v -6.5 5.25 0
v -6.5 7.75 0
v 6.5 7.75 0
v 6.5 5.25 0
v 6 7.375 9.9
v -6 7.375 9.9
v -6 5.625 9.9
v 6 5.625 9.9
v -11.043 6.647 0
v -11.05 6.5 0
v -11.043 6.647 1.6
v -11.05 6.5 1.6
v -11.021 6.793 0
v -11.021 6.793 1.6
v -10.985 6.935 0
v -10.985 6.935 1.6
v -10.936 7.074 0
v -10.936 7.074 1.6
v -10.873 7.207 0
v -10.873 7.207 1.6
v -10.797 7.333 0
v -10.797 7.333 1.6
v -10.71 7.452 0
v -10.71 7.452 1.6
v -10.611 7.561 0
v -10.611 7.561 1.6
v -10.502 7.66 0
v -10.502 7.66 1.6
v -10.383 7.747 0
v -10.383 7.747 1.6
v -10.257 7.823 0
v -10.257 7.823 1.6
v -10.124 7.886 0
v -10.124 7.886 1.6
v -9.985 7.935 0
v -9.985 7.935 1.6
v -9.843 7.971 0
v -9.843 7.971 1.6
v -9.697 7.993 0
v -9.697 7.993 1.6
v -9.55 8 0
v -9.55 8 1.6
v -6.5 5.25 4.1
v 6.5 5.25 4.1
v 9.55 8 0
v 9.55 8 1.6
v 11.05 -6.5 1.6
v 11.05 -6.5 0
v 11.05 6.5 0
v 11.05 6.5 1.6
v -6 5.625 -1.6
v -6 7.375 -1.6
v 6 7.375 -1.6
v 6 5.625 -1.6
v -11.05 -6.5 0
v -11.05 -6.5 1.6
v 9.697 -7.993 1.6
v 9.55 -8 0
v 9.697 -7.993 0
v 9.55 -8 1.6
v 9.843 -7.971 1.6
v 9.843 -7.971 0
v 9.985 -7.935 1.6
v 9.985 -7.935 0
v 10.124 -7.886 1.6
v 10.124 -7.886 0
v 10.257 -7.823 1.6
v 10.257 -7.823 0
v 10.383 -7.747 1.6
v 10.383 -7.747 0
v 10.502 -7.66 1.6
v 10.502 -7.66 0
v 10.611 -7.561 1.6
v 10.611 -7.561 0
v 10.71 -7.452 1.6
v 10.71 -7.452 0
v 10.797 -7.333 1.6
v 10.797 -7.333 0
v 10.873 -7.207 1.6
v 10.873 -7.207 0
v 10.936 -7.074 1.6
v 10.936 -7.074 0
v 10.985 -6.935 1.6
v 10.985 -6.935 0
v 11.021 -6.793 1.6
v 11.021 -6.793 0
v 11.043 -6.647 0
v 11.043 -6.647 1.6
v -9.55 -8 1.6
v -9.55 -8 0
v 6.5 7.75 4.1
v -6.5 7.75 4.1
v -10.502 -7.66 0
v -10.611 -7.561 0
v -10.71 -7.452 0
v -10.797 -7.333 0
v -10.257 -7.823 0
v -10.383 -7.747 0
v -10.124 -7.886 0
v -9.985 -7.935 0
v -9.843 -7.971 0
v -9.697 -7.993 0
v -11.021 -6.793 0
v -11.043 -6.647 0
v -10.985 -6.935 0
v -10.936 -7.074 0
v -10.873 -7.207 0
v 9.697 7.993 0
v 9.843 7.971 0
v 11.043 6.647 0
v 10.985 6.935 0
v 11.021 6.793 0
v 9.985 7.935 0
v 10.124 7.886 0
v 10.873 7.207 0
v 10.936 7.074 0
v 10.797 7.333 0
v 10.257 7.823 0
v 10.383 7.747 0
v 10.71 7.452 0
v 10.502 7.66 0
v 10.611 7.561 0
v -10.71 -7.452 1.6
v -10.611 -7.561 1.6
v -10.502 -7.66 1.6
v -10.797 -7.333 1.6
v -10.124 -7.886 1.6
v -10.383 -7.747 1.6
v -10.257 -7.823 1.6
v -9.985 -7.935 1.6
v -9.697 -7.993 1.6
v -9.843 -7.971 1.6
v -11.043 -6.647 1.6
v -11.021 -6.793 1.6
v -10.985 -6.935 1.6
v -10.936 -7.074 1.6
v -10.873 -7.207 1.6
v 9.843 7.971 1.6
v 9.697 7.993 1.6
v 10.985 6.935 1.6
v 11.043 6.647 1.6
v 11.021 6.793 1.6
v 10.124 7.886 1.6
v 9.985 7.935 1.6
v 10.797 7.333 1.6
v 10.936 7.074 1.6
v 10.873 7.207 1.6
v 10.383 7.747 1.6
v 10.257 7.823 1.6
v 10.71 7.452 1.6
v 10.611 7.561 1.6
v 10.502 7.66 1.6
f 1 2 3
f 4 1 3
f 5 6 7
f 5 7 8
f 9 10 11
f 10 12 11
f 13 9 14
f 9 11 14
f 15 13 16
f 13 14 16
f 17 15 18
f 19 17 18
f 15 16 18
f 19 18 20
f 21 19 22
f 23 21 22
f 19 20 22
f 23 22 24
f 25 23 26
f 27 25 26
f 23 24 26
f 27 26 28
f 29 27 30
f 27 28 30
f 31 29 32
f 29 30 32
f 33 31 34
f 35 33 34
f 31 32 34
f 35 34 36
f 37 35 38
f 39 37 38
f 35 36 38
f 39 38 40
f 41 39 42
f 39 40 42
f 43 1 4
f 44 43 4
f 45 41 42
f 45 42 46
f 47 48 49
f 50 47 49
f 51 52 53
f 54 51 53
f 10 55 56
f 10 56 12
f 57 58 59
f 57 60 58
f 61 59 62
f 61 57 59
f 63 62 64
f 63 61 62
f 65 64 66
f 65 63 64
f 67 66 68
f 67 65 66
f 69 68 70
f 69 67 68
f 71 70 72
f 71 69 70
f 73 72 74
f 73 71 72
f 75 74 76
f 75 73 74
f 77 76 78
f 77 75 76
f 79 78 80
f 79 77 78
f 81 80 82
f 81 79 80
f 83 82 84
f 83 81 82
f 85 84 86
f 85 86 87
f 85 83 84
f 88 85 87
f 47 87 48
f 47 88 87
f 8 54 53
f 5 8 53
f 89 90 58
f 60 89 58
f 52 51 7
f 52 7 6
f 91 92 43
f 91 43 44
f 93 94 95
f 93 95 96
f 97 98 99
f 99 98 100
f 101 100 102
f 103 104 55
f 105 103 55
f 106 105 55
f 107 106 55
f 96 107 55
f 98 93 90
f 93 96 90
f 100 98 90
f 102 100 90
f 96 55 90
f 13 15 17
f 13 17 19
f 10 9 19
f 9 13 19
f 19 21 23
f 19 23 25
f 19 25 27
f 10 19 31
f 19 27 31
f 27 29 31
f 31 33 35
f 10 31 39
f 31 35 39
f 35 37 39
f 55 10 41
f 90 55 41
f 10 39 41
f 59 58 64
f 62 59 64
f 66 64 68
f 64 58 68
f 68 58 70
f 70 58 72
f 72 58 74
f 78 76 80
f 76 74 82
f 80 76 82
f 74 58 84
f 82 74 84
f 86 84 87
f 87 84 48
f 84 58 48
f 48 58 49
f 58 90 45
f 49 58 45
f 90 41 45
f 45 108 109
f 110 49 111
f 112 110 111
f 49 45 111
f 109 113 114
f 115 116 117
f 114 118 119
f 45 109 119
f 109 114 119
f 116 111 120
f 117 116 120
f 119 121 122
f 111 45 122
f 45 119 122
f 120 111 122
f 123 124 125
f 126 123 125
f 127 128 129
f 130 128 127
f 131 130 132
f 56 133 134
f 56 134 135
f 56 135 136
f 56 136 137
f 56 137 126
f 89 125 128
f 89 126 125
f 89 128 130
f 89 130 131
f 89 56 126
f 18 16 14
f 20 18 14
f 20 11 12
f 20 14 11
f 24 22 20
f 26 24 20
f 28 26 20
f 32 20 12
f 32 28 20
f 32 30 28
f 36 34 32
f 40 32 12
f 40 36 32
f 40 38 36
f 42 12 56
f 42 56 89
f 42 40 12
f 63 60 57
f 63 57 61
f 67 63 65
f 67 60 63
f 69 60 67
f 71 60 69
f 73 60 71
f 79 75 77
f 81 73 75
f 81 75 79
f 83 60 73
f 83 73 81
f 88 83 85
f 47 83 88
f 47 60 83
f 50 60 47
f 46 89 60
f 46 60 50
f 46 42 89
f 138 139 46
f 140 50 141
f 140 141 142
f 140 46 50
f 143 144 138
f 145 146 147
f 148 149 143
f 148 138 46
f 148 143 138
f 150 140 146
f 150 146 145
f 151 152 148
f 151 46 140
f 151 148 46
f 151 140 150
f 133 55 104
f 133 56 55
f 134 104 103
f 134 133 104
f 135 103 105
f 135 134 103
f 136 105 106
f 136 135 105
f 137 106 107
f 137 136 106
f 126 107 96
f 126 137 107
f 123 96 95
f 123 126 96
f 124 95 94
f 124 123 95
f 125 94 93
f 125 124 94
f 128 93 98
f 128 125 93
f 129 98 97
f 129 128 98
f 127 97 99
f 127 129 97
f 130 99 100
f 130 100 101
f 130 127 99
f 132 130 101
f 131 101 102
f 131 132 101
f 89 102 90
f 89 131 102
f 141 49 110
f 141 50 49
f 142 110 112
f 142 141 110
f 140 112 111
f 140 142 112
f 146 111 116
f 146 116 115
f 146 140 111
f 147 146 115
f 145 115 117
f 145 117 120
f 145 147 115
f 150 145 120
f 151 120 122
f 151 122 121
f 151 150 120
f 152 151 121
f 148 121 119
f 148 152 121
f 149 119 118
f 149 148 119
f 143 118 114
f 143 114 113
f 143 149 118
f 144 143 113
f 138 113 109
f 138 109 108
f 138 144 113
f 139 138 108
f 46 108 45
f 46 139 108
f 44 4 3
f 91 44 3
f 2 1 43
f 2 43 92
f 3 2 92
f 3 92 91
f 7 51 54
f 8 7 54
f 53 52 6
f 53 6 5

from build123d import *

# Parameters (mm, degrees)
SKETCH1_W                = 22.1
SKETCH1_H                = 16
BOSS_EXTRUDE1_DEPTH      = 1.6
BOSS_EXTRUDE2_DEPTH      = 9.9
BOSS_EXTRUDE2_DEPTH_BACK = 1.6
SKETCH1_3_W              = 12
SKETCH1_3_H              = 1.75
SKETCH1_4_W              = 13
SKETCH1_4_H              = 2.5
BOSS_EXTRUDE3_DEPTH      = 4.1
FILLET1_R                = 1.5


with BuildPart() as part:
    # Sketch1 → Boss-Extrude1 (new body)
    with BuildSketch(Plane.XY):
        Rectangle(SKETCH1_W, SKETCH1_H)
    extrude(amount=BOSS_EXTRUDE1_DEPTH)

    # Fillet1
    fillet1_edges = [part.edges().sort_by_distance(p)[0] for p in [
        (11.05, 8, 0.8),
        (11.05, -8, 0.8),
        (-11.05, -8, 0.8),
        (-11.05, 8, 0.8),
    ]]
    fillet(fillet1_edges, radius=FILLET1_R)


with BuildPart() as body_2:
    # Sketch1<3> → Boss-Extrude2 (new, two sides: drawn at the far end of the back side and taken through both)
    with BuildSketch(Plane.XY.offset(-BOSS_EXTRUDE2_DEPTH_BACK)):
        with Locations((0, 6.5)):
            Rectangle(SKETCH1_3_W, SKETCH1_3_H)
    extrude(amount=BOSS_EXTRUDE2_DEPTH + BOSS_EXTRUDE2_DEPTH_BACK)


with BuildPart() as body_3:
    # Sketch1<4> → Boss-Extrude3 (new body)
    with BuildSketch(Plane.XY):
        with Locations((0, 6.5)):
            Rectangle(SKETCH1_4_W, SKETCH1_4_H)
    extrude(amount=BOSS_EXTRUDE3_DEPTH)


solid = Compound([part.part, body_2.part, body_3.part])
